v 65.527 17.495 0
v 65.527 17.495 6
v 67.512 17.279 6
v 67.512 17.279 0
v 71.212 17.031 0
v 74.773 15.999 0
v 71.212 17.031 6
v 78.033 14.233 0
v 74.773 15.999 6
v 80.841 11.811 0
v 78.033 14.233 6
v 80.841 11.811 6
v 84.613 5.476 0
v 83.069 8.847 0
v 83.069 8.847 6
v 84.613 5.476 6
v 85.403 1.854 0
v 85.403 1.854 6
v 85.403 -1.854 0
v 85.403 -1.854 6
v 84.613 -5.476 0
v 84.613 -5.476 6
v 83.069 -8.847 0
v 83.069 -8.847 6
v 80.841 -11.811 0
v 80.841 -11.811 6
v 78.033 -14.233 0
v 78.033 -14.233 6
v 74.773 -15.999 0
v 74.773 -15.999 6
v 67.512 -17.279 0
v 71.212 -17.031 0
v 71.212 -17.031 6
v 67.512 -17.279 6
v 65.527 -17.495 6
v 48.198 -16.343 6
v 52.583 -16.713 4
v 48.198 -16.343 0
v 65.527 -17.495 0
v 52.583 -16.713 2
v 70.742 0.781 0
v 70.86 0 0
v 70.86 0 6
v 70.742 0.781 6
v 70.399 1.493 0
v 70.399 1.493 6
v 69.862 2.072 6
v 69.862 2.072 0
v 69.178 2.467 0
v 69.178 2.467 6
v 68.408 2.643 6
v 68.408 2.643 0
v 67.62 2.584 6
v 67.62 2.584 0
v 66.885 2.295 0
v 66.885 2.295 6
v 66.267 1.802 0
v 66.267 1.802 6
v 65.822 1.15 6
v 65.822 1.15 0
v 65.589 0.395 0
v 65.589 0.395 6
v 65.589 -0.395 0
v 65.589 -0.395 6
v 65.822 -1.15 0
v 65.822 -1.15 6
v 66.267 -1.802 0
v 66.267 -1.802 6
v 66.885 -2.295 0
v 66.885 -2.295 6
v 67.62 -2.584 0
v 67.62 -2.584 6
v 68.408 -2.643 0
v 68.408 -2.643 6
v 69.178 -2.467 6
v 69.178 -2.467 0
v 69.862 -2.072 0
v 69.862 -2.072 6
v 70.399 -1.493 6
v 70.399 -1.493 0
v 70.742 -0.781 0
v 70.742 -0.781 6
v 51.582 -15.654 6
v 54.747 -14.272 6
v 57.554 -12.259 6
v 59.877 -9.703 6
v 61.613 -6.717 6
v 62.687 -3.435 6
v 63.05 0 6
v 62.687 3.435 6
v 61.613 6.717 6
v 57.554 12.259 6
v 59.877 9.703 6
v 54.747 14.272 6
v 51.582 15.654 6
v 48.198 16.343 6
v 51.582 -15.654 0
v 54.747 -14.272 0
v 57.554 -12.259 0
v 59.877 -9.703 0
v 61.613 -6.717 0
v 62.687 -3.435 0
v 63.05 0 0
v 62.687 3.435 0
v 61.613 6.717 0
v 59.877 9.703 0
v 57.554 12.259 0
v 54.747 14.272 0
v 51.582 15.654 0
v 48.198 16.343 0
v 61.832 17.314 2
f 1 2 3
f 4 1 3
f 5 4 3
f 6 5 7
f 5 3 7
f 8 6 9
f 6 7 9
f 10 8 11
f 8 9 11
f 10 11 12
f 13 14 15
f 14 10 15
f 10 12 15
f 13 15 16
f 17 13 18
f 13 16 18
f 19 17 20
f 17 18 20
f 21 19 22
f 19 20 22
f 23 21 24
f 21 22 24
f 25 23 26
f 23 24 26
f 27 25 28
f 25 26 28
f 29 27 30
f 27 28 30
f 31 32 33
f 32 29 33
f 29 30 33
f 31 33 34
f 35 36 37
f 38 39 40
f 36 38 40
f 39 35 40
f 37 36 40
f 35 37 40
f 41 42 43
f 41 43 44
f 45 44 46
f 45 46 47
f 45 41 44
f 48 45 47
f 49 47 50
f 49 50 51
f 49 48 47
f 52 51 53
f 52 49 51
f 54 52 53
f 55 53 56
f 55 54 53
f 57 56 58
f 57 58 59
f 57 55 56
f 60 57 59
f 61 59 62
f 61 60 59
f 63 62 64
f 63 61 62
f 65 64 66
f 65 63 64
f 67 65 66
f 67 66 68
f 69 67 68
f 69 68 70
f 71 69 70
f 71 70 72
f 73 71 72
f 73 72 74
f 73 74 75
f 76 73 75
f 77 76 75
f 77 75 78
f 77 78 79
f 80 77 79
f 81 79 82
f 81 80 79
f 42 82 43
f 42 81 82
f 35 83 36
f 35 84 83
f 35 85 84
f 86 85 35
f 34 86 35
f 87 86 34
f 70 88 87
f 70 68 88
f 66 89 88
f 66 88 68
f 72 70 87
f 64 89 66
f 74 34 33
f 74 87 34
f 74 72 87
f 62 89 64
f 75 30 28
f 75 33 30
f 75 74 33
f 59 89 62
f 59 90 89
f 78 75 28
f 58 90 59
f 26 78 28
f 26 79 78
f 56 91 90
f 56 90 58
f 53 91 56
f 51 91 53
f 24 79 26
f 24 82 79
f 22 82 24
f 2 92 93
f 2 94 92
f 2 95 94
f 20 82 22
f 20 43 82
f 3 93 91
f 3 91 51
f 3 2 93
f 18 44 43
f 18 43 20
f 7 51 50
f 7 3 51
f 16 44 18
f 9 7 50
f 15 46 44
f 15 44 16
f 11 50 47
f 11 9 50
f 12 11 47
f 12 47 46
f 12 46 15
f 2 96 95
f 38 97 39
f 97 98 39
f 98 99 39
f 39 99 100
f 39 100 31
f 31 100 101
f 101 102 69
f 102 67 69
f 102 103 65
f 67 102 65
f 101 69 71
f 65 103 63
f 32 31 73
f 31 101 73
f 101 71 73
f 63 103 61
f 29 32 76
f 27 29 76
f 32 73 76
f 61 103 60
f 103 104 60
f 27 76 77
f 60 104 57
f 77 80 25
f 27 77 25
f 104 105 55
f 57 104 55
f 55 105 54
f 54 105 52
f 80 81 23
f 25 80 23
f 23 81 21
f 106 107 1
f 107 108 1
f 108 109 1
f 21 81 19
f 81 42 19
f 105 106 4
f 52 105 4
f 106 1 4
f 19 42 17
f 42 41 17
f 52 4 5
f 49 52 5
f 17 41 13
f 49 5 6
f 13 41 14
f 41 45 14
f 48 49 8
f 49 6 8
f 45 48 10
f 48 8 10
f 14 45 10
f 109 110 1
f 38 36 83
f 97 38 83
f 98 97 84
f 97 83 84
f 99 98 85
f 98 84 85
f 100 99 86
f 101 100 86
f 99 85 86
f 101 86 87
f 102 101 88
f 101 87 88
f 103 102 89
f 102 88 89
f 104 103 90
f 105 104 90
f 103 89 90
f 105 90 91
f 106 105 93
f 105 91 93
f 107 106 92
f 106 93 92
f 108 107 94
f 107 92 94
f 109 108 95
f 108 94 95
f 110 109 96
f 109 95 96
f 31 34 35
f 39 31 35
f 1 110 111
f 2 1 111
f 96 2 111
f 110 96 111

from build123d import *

# Parameters (mm, degrees)
SKETCH2_R           = 2.65
BOSS_EXTRUDE4_DEPTH = 6
CUT_EXTRUDE2_DEPTH  = 88.793483499


with BuildPart() as part:
    # Sketch2 → Boss-Extrude4 (new body)
    with BuildSketch(Plane.XY):
        with BuildLine():
            add(Edge.make_bspline(
                [(67.5, 17.578928476), (65.61016752, 17.502615465), (60.634413429, 17.271238409), (53.13057404, 16.789010877), (47.524682176, 16.292383273), (45, 16.035396523)],
                knots=[0.381536428, 0.381536428, 0.381536428, 0.381536428, 0.390812303, 0.405965006, 0.418410632, 0.418410632, 0.418410632, 0.418410632], degree=3))
            ThreePointArc((45, 16.035396523), (62.750493933, 0), (45, -16.035396523))
            add(Edge.make_bspline(
                [(45, -16.035396523), (47.524682176, -16.292383273), (53.13057404, -16.789010877), (60.634413429, -17.271238409), (65.61016752, -17.502615465), (67.5, -17.578928476)],
                knots=[0.581589368, 0.581589368, 0.581589368, 0.581589368, 0.594034994, 0.609187697, 0.618463572, 0.618463572, 0.618463572, 0.618463572], degree=3))
            ThreePointArc((67.5, -17.578928476), (85.803106629, 0), (67.5, 17.578928476))
        make_face()
        with Locations((68.209851787, 0)):
            Circle(SKETCH2_R, mode=Mode.SUBTRACT)
    extrude(amount=BOSS_EXTRUDE4_DEPTH)

    # Sketch4 → Cut-Extrude2 (cut, through all)
    with BuildSketch(Plane.XY.offset(6)):
        with BuildLine():
            Line((65.5273107, 17.495020066), (67.512104385, 17.279172769))
            ThreePointArc((67.512104385, 17.279172769), (85.503106629, 0), (67.512104385, -17.279172769))
            Line((67.512104385, -17.279172769), (65.5273107, -17.495020066))
            add(Edge.make_bspline(
                [(65.5273107, -17.495020066), (66.184811673, -17.524419912), (66.842377464, -17.55237313), (67.5, -17.578928476)],
                knots=[0.615235759, 0.615235759, 0.615235759, 0.615235759, 0.618463572, 0.618463572, 0.618463572, 0.618463572], degree=3))
            ThreePointArc((67.5, -17.578928476), (85.803106629, 0), (67.5, 17.578928476))
            add(Edge.make_bspline(
                [(67.5, 17.578928476), (66.842377464, 17.55237313), (66.184811673, 17.524419912), (65.5273107, 17.495020066)],
                knots=[0.381536428, 0.381536428, 0.381536428, 0.381536428, 0.384764241, 0.384764241, 0.384764241, 0.384764241], degree=3))
        make_face()
        with BuildLine():
            ThreePointArc((48.197537186, -16.3434678), (63.050493933, 0), (48.197537186, 16.3434678))
            add(Edge.make_bspline(
                [(48.197537186, 16.3434678), (47.131160592, 16.246385916), (46.065284113, 16.143831519), (45, 16.035396523)],
                knots=[0.413159228, 0.413159228, 0.413159228, 0.413159228, 0.418410632, 0.418410632, 0.418410632, 0.418410632], degree=3))
            ThreePointArc((45, 16.035396523), (62.750493933, 0), (45, -16.035396523))
            add(Edge.make_bspline(
                [(45, -16.035396523), (46.065284113, -16.143831519), (47.131160592, -16.246385916), (48.197537186, -16.3434678)],
                knots=[0.581589368, 0.581589368, 0.581589368, 0.581589368, 0.586840772, 0.586840772, 0.586840772, 0.586840772], degree=3))
        make_face()
    extrude(amount=-CUT_EXTRUDE2_DEPTH, mode=Mode.SUBTRACT)


solid = part.part
